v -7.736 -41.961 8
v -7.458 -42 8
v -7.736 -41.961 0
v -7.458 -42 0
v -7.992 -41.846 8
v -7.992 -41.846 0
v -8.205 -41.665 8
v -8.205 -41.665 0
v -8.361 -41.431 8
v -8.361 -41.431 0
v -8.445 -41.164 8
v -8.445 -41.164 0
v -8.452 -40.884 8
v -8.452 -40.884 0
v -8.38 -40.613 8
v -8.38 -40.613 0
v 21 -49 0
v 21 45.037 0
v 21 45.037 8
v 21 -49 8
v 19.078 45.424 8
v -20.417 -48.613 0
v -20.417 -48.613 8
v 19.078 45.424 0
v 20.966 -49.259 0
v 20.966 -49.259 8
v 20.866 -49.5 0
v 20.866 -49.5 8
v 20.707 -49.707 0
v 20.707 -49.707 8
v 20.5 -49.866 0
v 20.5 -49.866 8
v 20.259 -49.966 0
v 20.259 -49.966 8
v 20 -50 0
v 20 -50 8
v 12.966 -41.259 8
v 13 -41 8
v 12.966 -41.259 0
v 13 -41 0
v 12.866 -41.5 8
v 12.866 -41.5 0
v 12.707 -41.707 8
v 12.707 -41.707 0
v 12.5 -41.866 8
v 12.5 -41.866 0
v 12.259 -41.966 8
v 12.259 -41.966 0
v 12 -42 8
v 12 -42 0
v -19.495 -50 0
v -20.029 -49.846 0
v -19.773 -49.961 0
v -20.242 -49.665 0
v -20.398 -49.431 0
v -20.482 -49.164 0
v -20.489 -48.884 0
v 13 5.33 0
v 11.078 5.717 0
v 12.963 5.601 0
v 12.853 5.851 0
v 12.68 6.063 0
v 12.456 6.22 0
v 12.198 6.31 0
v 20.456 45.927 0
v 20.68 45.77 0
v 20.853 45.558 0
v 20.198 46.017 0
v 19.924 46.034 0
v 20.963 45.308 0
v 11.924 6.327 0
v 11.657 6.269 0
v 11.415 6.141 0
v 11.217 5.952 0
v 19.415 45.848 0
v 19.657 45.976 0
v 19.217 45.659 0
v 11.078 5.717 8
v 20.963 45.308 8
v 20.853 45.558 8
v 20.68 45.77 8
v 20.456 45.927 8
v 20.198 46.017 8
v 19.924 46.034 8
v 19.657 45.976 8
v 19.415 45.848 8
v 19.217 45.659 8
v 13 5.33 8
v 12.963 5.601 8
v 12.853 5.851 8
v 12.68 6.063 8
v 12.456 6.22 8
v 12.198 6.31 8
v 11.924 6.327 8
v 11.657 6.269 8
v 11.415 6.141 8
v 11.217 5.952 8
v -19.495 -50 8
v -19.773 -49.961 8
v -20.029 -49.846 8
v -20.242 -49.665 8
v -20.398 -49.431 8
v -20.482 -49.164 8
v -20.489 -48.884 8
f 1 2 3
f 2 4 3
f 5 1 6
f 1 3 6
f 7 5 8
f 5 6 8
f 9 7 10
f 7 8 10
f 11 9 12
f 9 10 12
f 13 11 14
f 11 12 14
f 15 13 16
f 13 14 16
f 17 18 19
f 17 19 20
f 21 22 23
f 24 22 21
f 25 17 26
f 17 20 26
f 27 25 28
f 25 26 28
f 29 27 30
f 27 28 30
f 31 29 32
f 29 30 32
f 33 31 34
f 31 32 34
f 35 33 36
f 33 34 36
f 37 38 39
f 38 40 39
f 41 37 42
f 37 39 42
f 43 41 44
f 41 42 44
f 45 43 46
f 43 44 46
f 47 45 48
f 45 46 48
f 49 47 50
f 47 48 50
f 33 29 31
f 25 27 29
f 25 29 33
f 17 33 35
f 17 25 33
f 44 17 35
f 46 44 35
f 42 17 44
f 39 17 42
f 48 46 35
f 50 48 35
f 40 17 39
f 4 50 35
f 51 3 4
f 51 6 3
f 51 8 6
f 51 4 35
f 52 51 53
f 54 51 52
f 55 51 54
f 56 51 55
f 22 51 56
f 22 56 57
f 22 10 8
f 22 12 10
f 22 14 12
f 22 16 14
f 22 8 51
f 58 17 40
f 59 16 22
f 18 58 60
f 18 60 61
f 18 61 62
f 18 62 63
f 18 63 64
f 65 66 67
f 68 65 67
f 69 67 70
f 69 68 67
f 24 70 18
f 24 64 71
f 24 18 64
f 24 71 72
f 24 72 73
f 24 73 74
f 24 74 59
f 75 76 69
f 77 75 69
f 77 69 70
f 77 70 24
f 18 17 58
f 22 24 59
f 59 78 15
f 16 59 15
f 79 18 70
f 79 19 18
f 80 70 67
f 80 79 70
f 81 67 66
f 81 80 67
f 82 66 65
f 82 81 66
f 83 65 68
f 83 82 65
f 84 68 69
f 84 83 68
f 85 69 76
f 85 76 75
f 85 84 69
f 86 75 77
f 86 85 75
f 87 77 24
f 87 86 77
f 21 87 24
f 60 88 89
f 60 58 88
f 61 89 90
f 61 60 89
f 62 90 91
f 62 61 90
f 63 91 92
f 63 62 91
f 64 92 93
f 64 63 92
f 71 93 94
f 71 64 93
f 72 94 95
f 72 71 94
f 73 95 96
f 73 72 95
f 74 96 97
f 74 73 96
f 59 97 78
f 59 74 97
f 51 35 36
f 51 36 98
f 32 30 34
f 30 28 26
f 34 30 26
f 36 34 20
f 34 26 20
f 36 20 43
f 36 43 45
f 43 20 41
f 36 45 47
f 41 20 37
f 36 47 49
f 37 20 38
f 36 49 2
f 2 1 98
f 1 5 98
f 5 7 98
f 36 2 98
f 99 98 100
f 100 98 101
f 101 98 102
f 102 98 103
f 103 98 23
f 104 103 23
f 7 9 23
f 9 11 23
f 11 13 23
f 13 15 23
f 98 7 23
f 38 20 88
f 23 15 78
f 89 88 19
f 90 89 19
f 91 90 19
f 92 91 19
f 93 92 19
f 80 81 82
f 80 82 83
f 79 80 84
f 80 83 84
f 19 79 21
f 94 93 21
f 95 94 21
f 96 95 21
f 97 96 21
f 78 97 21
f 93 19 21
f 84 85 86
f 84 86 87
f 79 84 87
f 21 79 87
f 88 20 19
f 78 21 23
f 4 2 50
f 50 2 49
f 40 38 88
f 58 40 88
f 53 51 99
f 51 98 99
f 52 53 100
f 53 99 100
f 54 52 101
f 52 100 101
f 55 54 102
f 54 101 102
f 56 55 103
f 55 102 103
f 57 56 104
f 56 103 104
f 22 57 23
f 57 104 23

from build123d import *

# Parameters (mm, degrees)
EXTRUDE_1_DEPTH     = 8
FILLET_1_R          = 1
CUT_EXTRUDE_1_DEPTH = 36
FILLET_2_R          = 1


with BuildPart() as part:
    # 스케치1 → 보스-돌출1 (new body)
    with BuildSketch(Plane.XY):
        Polygon((21, 50), (21, -50), (-21, -50), align=None)
    extrude(amount=EXTRUDE_1_DEPTH)

    # 필렛1
    fillet_1_edges = [part.edges().sort_by_distance(p)[0] for p in [
        (21, -50, 4),
        (-21, -50, 4),
        (21, 50, 4),
    ]]
    fillet(fillet_1_edges, radius=FILLET_1_R)

    # 스케치2 → 컷-돌출1 (cut)
    with BuildSketch(Plane.XY.offset(8)):
        Polygon((13, -42), (13, 10.292957161), (-8.963042008, -42), align=None)
    extrude(amount=-CUT_EXTRUDE_1_DEPTH, mode=Mode.SUBTRACT)

    # 필렛2
    fillet_2_edges = [part.edges().sort_by_distance(p)[0] for p in [
        (13, 10.292957161, 4),
        (13, -42, 4),
        (-8.963042008, -42, 4),
    ]]
    fillet(fillet_2_edges, radius=FILLET_2_R)


solid = part.part
